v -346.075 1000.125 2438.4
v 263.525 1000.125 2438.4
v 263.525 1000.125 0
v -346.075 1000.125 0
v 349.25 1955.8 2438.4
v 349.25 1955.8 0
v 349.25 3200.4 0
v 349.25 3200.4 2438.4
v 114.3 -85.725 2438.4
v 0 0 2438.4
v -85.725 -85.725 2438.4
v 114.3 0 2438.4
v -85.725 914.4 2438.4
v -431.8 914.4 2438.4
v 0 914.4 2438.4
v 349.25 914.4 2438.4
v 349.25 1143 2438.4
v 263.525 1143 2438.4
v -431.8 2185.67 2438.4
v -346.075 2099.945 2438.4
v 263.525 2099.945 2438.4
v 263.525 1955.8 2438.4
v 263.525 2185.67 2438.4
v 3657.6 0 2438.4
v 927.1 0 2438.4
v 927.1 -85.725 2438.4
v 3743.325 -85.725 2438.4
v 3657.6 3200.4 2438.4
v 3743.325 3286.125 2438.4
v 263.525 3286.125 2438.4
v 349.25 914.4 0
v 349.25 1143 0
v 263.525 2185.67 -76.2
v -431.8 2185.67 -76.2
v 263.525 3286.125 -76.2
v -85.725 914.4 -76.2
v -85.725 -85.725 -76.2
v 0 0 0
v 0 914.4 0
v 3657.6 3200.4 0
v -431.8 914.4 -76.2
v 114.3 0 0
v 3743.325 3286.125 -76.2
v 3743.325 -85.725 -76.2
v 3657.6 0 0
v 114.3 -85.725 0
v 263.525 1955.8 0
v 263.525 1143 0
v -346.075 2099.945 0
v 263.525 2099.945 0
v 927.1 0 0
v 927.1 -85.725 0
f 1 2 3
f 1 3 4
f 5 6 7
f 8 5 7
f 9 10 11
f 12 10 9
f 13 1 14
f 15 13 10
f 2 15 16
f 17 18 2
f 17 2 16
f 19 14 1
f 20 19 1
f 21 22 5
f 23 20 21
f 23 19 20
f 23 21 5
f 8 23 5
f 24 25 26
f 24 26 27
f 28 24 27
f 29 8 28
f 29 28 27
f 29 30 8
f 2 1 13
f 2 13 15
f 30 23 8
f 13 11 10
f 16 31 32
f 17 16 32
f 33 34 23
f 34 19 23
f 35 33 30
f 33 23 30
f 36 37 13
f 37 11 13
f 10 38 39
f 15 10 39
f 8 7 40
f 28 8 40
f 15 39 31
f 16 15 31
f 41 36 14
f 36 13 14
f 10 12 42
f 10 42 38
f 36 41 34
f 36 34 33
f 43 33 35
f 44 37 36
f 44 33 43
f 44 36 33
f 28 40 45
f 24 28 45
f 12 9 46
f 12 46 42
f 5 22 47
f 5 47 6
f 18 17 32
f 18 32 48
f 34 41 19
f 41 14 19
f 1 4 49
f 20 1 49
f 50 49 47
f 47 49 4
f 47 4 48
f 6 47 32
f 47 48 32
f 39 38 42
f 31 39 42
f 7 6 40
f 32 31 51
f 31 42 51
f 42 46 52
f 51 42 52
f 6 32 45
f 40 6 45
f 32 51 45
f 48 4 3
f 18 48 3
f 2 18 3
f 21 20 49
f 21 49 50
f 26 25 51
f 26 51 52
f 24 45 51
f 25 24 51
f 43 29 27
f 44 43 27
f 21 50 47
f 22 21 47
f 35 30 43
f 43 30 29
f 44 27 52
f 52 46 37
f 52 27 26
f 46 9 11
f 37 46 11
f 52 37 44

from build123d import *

# Parameters (mm, degrees)
F1_DEPTH = 2438.4
F3_DEPTH = 76.2


with BuildPart() as f1:
    # F0 (on Top) → F1 (new body)
    with BuildSketch(Plane.XY):
        Polygon((114.3, 0), (0, 0), (0, 914.4), (349.25, 914.4), (349.25, 1143), (263.525, 1143), (263.525, 1000.125), (-85.725, 1000.125), (-346.075, 1000.125), (-346.075, 2099.945), (263.525, 2099.945), (263.525, 1955.8), (349.25, 1955.8), (349.25, 2641.6), (349.25, 2743.2), (349.25, 3200.4), (1219.2, 3200.4), (3657.6, 3200.4), (3657.6, 0), (3203.849826, 0), (2797.449826, 0), (2743.2, 0), (1066.8, 0), (927.1, 0), (927.1, -85.725), (3743.325, -85.725), (3743.325, 3286.125), (263.525, 3286.125), (263.525, 2629.454412), (263.525, 2185.67), (-431.8, 2185.67), (-431.8, 914.4), (-85.725, 914.4), (-85.725, -85.725), (114.3, -85.725), align=None)
    extrude(amount=F1_DEPTH)

    # F2 (on face) → F3 (join)
    with BuildSketch(Plane(origin=(0, 0, 0), x_dir=(1, 0, 0), z_dir=(0, 0, -1))):
        Polygon((3743.325, 85.725), (-85.725, 85.725), (-85.725, -914.4), (-431.8, -914.4), (-431.8, -2185.67), (263.525, -2185.67), (263.525, -3286.125), (3743.325, -3286.125), align=None)
    extrude(amount=F3_DEPTH)


solid = f1.part
